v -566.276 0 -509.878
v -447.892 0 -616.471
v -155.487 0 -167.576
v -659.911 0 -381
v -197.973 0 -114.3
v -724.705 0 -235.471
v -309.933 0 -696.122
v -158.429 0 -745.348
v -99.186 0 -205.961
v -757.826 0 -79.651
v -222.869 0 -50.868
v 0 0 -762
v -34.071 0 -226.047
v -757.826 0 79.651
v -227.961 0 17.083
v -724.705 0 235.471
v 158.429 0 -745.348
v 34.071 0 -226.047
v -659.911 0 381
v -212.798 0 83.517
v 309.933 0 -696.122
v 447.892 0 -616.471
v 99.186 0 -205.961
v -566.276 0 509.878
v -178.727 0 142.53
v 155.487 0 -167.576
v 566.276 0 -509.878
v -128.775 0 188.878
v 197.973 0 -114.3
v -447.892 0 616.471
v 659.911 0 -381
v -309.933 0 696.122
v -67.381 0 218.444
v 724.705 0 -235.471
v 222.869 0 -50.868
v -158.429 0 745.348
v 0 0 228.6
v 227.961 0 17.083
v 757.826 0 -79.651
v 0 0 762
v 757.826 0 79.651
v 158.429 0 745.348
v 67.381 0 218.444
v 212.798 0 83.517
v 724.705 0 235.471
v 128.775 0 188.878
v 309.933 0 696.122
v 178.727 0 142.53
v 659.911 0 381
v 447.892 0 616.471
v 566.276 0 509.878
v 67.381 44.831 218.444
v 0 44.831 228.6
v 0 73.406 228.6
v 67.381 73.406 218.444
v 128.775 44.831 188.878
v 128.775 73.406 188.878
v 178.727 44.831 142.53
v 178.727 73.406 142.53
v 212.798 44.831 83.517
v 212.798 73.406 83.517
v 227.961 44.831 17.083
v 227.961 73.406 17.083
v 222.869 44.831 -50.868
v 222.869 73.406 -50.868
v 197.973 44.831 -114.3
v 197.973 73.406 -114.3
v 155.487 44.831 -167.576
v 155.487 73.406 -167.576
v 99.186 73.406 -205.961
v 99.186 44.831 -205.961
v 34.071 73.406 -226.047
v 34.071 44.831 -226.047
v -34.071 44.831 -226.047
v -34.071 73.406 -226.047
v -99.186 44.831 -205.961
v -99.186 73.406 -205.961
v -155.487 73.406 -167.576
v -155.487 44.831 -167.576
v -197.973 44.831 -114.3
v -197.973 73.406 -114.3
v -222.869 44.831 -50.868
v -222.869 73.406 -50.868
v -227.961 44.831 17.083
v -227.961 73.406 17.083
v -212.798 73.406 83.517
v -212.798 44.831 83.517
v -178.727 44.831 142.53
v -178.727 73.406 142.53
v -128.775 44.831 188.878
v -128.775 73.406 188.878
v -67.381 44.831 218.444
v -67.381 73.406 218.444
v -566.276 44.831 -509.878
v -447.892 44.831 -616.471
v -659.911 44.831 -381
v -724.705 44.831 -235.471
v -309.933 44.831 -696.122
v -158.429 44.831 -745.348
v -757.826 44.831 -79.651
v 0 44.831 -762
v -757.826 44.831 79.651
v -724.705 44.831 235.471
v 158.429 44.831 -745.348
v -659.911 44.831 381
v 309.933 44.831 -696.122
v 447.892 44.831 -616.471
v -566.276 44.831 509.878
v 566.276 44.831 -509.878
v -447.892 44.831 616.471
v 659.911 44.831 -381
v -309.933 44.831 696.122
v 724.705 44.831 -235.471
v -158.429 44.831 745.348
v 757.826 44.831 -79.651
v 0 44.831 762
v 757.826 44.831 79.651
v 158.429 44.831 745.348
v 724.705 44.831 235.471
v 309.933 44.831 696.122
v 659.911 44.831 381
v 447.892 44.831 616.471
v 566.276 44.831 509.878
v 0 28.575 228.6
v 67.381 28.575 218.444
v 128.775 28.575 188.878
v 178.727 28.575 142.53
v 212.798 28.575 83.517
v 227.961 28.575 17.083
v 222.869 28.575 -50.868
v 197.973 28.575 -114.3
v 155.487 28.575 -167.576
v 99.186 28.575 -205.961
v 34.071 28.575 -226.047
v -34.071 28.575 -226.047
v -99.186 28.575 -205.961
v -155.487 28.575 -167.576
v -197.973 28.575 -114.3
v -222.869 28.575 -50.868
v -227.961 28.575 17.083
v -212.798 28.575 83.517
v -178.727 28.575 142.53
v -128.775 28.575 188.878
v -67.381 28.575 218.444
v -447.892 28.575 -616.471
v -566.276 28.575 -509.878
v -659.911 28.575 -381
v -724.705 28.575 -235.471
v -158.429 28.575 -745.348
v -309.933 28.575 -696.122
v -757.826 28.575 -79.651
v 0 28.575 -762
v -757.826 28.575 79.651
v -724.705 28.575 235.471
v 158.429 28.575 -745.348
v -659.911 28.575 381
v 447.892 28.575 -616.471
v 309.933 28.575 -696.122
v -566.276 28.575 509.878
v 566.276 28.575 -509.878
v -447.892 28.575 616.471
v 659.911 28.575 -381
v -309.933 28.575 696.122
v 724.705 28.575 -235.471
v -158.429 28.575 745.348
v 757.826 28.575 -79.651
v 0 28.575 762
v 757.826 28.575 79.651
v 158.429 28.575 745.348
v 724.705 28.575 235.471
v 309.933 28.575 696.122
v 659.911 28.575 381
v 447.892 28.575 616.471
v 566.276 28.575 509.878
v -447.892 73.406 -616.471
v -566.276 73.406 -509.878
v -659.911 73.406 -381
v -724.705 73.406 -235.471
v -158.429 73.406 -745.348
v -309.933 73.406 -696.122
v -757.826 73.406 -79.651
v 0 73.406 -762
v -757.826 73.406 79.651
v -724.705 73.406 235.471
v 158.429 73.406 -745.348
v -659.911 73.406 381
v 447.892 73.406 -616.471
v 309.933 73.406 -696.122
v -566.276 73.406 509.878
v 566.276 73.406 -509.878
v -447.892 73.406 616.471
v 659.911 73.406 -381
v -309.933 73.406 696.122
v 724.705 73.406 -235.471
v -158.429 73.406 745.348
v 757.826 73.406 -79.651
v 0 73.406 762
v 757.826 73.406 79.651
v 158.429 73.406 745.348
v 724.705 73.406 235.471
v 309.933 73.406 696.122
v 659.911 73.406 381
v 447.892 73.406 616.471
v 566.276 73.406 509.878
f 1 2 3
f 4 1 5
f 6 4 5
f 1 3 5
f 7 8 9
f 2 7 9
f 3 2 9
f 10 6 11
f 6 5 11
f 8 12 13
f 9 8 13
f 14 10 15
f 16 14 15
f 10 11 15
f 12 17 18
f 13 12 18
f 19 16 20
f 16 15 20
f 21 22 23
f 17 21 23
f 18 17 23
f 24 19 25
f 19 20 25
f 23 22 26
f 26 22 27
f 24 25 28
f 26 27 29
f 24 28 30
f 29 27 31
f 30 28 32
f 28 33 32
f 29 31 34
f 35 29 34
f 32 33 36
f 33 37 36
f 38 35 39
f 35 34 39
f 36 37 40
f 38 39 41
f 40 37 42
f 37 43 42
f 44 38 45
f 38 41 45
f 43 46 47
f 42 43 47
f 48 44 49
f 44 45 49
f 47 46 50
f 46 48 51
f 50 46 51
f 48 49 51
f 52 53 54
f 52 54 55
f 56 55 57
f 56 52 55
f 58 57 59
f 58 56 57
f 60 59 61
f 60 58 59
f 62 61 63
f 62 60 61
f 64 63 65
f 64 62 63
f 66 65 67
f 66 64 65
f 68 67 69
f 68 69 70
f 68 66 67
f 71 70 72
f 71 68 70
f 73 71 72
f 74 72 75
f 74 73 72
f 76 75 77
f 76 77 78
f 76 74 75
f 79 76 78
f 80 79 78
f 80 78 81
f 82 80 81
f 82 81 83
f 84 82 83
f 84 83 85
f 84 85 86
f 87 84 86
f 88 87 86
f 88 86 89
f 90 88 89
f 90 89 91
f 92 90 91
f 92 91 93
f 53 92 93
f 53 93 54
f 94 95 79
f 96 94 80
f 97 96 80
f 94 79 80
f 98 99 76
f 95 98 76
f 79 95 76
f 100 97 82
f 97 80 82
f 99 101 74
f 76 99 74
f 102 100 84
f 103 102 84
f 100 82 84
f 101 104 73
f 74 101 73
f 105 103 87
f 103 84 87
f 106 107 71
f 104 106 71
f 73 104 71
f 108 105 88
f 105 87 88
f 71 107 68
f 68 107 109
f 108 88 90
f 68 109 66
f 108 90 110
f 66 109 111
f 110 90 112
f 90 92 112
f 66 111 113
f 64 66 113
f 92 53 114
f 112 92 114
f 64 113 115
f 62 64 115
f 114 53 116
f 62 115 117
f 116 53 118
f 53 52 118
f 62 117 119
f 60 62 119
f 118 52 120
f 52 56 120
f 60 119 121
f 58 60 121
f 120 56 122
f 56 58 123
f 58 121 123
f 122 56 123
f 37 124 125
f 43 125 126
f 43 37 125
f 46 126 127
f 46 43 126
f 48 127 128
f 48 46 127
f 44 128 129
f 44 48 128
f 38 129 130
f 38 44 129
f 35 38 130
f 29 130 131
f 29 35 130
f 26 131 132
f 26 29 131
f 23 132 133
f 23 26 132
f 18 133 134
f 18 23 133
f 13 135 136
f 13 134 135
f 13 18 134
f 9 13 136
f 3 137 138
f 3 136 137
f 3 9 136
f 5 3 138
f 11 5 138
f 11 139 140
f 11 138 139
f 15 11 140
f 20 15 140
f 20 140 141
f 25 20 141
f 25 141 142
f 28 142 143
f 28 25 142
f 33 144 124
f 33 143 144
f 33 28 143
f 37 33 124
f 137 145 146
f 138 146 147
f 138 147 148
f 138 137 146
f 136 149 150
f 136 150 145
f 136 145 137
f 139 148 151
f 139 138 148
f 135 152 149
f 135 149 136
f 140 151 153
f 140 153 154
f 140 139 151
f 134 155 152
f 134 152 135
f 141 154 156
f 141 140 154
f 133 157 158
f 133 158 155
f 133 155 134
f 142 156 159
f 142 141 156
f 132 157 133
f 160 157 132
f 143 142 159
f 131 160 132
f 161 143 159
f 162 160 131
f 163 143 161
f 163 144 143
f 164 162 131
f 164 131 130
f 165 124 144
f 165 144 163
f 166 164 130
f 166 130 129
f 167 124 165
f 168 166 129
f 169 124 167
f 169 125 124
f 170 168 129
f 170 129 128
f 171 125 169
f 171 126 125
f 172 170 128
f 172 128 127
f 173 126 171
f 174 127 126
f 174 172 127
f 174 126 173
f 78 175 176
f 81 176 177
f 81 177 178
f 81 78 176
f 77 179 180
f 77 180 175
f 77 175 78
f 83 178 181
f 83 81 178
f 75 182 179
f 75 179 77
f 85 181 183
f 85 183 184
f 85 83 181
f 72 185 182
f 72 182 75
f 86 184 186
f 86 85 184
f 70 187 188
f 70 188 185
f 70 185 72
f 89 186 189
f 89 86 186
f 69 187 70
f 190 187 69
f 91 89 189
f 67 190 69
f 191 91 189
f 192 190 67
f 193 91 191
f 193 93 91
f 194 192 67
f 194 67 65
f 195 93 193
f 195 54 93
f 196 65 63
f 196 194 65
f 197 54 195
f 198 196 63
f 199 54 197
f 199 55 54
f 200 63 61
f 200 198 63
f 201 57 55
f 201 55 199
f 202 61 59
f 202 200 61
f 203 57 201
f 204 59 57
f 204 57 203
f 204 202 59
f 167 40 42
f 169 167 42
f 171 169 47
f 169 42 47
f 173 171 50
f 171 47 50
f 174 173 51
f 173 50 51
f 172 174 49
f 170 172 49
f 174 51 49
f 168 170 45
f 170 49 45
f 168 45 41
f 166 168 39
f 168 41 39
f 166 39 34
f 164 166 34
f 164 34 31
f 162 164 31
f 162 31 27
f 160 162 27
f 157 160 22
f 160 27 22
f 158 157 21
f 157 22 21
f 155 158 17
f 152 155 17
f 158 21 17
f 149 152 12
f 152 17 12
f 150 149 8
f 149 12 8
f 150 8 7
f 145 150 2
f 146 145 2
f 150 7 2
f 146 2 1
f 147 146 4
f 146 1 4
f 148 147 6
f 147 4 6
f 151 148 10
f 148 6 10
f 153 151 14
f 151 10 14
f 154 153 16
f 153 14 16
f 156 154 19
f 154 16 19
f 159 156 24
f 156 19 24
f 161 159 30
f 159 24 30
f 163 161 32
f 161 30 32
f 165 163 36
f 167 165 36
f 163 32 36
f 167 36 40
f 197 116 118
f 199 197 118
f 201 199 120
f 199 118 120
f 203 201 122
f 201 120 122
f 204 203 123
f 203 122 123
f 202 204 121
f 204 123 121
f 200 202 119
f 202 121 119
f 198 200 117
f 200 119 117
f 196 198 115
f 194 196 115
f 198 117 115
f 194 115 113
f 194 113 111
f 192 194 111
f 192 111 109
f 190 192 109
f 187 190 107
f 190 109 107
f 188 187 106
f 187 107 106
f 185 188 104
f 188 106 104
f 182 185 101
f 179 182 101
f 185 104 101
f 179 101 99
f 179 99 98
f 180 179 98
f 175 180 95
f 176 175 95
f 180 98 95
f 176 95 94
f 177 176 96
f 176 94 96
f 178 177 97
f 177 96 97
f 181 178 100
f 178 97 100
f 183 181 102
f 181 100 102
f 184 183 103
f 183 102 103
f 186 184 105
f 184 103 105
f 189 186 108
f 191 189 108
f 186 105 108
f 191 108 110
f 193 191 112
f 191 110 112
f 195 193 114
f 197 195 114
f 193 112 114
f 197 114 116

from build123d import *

# Parameters (mm, degrees)
SKETCH1_R          = 762
BOTTOMTABLE_DEPTH  = 28.575
SKETCH2_R          = 762
TOPTABLE_DEPTH     = 28.575
CUT_EXTRUDE1_START = -73.406
SKETCH3_R          = 228.6
CUT_EXTRUDE1_DEPTH = 73.406


with BuildPart() as part:
    # Sketch1 → bottomTable (new body)
    with BuildSketch(Plane(origin=(0, 0, 0), x_dir=(1, 0, 0), z_dir=(0, 1, 0))):
        with Locations(Location((0, 0, 0), (0, 0, 270))):
            Circle(SKETCH1_R)
    extrude(amount=BOTTOMTABLE_DEPTH)


with BuildPart() as body_2:
    # Sketch2 → topTable (new body)
    with BuildSketch(Plane(origin=(0, 44.831, 0), x_dir=(1, 0, 0), z_dir=(0, 1, 0))):
        with Locations(Location((0, 0, 0), (0, 0, 270))):
            Circle(SKETCH2_R)
    extrude(amount=TOPTABLE_DEPTH)


with BuildPart() as cut_extrude1_tool:
    # Sketch3 → Cut-Extrude1 (new body)
    with BuildSketch(Plane(origin=(0, 73.406, 0), x_dir=(1, 0, 0), z_dir=(0, 1, 0)).offset(CUT_EXTRUDE1_START)):
        with Locations(Location((0, 0, 0), (0, 0, 270))):
            Circle(SKETCH3_R)
    extrude(amount=CUT_EXTRUDE1_DEPTH)


with BuildPart() as part_1:
    add(part.part)

    # Cut-Extrude1: cut by cut_extrude1_tool
    add(cut_extrude1_tool.part, mode=Mode.SUBTRACT)


with BuildPart() as body_2_1:
    add(body_2.part)

    # Cut-Extrude1: cut by cut_extrude1_tool
    add(cut_extrude1_tool.part, mode=Mode.SUBTRACT)


solid = Compound([part_1.part, body_2_1.part])
